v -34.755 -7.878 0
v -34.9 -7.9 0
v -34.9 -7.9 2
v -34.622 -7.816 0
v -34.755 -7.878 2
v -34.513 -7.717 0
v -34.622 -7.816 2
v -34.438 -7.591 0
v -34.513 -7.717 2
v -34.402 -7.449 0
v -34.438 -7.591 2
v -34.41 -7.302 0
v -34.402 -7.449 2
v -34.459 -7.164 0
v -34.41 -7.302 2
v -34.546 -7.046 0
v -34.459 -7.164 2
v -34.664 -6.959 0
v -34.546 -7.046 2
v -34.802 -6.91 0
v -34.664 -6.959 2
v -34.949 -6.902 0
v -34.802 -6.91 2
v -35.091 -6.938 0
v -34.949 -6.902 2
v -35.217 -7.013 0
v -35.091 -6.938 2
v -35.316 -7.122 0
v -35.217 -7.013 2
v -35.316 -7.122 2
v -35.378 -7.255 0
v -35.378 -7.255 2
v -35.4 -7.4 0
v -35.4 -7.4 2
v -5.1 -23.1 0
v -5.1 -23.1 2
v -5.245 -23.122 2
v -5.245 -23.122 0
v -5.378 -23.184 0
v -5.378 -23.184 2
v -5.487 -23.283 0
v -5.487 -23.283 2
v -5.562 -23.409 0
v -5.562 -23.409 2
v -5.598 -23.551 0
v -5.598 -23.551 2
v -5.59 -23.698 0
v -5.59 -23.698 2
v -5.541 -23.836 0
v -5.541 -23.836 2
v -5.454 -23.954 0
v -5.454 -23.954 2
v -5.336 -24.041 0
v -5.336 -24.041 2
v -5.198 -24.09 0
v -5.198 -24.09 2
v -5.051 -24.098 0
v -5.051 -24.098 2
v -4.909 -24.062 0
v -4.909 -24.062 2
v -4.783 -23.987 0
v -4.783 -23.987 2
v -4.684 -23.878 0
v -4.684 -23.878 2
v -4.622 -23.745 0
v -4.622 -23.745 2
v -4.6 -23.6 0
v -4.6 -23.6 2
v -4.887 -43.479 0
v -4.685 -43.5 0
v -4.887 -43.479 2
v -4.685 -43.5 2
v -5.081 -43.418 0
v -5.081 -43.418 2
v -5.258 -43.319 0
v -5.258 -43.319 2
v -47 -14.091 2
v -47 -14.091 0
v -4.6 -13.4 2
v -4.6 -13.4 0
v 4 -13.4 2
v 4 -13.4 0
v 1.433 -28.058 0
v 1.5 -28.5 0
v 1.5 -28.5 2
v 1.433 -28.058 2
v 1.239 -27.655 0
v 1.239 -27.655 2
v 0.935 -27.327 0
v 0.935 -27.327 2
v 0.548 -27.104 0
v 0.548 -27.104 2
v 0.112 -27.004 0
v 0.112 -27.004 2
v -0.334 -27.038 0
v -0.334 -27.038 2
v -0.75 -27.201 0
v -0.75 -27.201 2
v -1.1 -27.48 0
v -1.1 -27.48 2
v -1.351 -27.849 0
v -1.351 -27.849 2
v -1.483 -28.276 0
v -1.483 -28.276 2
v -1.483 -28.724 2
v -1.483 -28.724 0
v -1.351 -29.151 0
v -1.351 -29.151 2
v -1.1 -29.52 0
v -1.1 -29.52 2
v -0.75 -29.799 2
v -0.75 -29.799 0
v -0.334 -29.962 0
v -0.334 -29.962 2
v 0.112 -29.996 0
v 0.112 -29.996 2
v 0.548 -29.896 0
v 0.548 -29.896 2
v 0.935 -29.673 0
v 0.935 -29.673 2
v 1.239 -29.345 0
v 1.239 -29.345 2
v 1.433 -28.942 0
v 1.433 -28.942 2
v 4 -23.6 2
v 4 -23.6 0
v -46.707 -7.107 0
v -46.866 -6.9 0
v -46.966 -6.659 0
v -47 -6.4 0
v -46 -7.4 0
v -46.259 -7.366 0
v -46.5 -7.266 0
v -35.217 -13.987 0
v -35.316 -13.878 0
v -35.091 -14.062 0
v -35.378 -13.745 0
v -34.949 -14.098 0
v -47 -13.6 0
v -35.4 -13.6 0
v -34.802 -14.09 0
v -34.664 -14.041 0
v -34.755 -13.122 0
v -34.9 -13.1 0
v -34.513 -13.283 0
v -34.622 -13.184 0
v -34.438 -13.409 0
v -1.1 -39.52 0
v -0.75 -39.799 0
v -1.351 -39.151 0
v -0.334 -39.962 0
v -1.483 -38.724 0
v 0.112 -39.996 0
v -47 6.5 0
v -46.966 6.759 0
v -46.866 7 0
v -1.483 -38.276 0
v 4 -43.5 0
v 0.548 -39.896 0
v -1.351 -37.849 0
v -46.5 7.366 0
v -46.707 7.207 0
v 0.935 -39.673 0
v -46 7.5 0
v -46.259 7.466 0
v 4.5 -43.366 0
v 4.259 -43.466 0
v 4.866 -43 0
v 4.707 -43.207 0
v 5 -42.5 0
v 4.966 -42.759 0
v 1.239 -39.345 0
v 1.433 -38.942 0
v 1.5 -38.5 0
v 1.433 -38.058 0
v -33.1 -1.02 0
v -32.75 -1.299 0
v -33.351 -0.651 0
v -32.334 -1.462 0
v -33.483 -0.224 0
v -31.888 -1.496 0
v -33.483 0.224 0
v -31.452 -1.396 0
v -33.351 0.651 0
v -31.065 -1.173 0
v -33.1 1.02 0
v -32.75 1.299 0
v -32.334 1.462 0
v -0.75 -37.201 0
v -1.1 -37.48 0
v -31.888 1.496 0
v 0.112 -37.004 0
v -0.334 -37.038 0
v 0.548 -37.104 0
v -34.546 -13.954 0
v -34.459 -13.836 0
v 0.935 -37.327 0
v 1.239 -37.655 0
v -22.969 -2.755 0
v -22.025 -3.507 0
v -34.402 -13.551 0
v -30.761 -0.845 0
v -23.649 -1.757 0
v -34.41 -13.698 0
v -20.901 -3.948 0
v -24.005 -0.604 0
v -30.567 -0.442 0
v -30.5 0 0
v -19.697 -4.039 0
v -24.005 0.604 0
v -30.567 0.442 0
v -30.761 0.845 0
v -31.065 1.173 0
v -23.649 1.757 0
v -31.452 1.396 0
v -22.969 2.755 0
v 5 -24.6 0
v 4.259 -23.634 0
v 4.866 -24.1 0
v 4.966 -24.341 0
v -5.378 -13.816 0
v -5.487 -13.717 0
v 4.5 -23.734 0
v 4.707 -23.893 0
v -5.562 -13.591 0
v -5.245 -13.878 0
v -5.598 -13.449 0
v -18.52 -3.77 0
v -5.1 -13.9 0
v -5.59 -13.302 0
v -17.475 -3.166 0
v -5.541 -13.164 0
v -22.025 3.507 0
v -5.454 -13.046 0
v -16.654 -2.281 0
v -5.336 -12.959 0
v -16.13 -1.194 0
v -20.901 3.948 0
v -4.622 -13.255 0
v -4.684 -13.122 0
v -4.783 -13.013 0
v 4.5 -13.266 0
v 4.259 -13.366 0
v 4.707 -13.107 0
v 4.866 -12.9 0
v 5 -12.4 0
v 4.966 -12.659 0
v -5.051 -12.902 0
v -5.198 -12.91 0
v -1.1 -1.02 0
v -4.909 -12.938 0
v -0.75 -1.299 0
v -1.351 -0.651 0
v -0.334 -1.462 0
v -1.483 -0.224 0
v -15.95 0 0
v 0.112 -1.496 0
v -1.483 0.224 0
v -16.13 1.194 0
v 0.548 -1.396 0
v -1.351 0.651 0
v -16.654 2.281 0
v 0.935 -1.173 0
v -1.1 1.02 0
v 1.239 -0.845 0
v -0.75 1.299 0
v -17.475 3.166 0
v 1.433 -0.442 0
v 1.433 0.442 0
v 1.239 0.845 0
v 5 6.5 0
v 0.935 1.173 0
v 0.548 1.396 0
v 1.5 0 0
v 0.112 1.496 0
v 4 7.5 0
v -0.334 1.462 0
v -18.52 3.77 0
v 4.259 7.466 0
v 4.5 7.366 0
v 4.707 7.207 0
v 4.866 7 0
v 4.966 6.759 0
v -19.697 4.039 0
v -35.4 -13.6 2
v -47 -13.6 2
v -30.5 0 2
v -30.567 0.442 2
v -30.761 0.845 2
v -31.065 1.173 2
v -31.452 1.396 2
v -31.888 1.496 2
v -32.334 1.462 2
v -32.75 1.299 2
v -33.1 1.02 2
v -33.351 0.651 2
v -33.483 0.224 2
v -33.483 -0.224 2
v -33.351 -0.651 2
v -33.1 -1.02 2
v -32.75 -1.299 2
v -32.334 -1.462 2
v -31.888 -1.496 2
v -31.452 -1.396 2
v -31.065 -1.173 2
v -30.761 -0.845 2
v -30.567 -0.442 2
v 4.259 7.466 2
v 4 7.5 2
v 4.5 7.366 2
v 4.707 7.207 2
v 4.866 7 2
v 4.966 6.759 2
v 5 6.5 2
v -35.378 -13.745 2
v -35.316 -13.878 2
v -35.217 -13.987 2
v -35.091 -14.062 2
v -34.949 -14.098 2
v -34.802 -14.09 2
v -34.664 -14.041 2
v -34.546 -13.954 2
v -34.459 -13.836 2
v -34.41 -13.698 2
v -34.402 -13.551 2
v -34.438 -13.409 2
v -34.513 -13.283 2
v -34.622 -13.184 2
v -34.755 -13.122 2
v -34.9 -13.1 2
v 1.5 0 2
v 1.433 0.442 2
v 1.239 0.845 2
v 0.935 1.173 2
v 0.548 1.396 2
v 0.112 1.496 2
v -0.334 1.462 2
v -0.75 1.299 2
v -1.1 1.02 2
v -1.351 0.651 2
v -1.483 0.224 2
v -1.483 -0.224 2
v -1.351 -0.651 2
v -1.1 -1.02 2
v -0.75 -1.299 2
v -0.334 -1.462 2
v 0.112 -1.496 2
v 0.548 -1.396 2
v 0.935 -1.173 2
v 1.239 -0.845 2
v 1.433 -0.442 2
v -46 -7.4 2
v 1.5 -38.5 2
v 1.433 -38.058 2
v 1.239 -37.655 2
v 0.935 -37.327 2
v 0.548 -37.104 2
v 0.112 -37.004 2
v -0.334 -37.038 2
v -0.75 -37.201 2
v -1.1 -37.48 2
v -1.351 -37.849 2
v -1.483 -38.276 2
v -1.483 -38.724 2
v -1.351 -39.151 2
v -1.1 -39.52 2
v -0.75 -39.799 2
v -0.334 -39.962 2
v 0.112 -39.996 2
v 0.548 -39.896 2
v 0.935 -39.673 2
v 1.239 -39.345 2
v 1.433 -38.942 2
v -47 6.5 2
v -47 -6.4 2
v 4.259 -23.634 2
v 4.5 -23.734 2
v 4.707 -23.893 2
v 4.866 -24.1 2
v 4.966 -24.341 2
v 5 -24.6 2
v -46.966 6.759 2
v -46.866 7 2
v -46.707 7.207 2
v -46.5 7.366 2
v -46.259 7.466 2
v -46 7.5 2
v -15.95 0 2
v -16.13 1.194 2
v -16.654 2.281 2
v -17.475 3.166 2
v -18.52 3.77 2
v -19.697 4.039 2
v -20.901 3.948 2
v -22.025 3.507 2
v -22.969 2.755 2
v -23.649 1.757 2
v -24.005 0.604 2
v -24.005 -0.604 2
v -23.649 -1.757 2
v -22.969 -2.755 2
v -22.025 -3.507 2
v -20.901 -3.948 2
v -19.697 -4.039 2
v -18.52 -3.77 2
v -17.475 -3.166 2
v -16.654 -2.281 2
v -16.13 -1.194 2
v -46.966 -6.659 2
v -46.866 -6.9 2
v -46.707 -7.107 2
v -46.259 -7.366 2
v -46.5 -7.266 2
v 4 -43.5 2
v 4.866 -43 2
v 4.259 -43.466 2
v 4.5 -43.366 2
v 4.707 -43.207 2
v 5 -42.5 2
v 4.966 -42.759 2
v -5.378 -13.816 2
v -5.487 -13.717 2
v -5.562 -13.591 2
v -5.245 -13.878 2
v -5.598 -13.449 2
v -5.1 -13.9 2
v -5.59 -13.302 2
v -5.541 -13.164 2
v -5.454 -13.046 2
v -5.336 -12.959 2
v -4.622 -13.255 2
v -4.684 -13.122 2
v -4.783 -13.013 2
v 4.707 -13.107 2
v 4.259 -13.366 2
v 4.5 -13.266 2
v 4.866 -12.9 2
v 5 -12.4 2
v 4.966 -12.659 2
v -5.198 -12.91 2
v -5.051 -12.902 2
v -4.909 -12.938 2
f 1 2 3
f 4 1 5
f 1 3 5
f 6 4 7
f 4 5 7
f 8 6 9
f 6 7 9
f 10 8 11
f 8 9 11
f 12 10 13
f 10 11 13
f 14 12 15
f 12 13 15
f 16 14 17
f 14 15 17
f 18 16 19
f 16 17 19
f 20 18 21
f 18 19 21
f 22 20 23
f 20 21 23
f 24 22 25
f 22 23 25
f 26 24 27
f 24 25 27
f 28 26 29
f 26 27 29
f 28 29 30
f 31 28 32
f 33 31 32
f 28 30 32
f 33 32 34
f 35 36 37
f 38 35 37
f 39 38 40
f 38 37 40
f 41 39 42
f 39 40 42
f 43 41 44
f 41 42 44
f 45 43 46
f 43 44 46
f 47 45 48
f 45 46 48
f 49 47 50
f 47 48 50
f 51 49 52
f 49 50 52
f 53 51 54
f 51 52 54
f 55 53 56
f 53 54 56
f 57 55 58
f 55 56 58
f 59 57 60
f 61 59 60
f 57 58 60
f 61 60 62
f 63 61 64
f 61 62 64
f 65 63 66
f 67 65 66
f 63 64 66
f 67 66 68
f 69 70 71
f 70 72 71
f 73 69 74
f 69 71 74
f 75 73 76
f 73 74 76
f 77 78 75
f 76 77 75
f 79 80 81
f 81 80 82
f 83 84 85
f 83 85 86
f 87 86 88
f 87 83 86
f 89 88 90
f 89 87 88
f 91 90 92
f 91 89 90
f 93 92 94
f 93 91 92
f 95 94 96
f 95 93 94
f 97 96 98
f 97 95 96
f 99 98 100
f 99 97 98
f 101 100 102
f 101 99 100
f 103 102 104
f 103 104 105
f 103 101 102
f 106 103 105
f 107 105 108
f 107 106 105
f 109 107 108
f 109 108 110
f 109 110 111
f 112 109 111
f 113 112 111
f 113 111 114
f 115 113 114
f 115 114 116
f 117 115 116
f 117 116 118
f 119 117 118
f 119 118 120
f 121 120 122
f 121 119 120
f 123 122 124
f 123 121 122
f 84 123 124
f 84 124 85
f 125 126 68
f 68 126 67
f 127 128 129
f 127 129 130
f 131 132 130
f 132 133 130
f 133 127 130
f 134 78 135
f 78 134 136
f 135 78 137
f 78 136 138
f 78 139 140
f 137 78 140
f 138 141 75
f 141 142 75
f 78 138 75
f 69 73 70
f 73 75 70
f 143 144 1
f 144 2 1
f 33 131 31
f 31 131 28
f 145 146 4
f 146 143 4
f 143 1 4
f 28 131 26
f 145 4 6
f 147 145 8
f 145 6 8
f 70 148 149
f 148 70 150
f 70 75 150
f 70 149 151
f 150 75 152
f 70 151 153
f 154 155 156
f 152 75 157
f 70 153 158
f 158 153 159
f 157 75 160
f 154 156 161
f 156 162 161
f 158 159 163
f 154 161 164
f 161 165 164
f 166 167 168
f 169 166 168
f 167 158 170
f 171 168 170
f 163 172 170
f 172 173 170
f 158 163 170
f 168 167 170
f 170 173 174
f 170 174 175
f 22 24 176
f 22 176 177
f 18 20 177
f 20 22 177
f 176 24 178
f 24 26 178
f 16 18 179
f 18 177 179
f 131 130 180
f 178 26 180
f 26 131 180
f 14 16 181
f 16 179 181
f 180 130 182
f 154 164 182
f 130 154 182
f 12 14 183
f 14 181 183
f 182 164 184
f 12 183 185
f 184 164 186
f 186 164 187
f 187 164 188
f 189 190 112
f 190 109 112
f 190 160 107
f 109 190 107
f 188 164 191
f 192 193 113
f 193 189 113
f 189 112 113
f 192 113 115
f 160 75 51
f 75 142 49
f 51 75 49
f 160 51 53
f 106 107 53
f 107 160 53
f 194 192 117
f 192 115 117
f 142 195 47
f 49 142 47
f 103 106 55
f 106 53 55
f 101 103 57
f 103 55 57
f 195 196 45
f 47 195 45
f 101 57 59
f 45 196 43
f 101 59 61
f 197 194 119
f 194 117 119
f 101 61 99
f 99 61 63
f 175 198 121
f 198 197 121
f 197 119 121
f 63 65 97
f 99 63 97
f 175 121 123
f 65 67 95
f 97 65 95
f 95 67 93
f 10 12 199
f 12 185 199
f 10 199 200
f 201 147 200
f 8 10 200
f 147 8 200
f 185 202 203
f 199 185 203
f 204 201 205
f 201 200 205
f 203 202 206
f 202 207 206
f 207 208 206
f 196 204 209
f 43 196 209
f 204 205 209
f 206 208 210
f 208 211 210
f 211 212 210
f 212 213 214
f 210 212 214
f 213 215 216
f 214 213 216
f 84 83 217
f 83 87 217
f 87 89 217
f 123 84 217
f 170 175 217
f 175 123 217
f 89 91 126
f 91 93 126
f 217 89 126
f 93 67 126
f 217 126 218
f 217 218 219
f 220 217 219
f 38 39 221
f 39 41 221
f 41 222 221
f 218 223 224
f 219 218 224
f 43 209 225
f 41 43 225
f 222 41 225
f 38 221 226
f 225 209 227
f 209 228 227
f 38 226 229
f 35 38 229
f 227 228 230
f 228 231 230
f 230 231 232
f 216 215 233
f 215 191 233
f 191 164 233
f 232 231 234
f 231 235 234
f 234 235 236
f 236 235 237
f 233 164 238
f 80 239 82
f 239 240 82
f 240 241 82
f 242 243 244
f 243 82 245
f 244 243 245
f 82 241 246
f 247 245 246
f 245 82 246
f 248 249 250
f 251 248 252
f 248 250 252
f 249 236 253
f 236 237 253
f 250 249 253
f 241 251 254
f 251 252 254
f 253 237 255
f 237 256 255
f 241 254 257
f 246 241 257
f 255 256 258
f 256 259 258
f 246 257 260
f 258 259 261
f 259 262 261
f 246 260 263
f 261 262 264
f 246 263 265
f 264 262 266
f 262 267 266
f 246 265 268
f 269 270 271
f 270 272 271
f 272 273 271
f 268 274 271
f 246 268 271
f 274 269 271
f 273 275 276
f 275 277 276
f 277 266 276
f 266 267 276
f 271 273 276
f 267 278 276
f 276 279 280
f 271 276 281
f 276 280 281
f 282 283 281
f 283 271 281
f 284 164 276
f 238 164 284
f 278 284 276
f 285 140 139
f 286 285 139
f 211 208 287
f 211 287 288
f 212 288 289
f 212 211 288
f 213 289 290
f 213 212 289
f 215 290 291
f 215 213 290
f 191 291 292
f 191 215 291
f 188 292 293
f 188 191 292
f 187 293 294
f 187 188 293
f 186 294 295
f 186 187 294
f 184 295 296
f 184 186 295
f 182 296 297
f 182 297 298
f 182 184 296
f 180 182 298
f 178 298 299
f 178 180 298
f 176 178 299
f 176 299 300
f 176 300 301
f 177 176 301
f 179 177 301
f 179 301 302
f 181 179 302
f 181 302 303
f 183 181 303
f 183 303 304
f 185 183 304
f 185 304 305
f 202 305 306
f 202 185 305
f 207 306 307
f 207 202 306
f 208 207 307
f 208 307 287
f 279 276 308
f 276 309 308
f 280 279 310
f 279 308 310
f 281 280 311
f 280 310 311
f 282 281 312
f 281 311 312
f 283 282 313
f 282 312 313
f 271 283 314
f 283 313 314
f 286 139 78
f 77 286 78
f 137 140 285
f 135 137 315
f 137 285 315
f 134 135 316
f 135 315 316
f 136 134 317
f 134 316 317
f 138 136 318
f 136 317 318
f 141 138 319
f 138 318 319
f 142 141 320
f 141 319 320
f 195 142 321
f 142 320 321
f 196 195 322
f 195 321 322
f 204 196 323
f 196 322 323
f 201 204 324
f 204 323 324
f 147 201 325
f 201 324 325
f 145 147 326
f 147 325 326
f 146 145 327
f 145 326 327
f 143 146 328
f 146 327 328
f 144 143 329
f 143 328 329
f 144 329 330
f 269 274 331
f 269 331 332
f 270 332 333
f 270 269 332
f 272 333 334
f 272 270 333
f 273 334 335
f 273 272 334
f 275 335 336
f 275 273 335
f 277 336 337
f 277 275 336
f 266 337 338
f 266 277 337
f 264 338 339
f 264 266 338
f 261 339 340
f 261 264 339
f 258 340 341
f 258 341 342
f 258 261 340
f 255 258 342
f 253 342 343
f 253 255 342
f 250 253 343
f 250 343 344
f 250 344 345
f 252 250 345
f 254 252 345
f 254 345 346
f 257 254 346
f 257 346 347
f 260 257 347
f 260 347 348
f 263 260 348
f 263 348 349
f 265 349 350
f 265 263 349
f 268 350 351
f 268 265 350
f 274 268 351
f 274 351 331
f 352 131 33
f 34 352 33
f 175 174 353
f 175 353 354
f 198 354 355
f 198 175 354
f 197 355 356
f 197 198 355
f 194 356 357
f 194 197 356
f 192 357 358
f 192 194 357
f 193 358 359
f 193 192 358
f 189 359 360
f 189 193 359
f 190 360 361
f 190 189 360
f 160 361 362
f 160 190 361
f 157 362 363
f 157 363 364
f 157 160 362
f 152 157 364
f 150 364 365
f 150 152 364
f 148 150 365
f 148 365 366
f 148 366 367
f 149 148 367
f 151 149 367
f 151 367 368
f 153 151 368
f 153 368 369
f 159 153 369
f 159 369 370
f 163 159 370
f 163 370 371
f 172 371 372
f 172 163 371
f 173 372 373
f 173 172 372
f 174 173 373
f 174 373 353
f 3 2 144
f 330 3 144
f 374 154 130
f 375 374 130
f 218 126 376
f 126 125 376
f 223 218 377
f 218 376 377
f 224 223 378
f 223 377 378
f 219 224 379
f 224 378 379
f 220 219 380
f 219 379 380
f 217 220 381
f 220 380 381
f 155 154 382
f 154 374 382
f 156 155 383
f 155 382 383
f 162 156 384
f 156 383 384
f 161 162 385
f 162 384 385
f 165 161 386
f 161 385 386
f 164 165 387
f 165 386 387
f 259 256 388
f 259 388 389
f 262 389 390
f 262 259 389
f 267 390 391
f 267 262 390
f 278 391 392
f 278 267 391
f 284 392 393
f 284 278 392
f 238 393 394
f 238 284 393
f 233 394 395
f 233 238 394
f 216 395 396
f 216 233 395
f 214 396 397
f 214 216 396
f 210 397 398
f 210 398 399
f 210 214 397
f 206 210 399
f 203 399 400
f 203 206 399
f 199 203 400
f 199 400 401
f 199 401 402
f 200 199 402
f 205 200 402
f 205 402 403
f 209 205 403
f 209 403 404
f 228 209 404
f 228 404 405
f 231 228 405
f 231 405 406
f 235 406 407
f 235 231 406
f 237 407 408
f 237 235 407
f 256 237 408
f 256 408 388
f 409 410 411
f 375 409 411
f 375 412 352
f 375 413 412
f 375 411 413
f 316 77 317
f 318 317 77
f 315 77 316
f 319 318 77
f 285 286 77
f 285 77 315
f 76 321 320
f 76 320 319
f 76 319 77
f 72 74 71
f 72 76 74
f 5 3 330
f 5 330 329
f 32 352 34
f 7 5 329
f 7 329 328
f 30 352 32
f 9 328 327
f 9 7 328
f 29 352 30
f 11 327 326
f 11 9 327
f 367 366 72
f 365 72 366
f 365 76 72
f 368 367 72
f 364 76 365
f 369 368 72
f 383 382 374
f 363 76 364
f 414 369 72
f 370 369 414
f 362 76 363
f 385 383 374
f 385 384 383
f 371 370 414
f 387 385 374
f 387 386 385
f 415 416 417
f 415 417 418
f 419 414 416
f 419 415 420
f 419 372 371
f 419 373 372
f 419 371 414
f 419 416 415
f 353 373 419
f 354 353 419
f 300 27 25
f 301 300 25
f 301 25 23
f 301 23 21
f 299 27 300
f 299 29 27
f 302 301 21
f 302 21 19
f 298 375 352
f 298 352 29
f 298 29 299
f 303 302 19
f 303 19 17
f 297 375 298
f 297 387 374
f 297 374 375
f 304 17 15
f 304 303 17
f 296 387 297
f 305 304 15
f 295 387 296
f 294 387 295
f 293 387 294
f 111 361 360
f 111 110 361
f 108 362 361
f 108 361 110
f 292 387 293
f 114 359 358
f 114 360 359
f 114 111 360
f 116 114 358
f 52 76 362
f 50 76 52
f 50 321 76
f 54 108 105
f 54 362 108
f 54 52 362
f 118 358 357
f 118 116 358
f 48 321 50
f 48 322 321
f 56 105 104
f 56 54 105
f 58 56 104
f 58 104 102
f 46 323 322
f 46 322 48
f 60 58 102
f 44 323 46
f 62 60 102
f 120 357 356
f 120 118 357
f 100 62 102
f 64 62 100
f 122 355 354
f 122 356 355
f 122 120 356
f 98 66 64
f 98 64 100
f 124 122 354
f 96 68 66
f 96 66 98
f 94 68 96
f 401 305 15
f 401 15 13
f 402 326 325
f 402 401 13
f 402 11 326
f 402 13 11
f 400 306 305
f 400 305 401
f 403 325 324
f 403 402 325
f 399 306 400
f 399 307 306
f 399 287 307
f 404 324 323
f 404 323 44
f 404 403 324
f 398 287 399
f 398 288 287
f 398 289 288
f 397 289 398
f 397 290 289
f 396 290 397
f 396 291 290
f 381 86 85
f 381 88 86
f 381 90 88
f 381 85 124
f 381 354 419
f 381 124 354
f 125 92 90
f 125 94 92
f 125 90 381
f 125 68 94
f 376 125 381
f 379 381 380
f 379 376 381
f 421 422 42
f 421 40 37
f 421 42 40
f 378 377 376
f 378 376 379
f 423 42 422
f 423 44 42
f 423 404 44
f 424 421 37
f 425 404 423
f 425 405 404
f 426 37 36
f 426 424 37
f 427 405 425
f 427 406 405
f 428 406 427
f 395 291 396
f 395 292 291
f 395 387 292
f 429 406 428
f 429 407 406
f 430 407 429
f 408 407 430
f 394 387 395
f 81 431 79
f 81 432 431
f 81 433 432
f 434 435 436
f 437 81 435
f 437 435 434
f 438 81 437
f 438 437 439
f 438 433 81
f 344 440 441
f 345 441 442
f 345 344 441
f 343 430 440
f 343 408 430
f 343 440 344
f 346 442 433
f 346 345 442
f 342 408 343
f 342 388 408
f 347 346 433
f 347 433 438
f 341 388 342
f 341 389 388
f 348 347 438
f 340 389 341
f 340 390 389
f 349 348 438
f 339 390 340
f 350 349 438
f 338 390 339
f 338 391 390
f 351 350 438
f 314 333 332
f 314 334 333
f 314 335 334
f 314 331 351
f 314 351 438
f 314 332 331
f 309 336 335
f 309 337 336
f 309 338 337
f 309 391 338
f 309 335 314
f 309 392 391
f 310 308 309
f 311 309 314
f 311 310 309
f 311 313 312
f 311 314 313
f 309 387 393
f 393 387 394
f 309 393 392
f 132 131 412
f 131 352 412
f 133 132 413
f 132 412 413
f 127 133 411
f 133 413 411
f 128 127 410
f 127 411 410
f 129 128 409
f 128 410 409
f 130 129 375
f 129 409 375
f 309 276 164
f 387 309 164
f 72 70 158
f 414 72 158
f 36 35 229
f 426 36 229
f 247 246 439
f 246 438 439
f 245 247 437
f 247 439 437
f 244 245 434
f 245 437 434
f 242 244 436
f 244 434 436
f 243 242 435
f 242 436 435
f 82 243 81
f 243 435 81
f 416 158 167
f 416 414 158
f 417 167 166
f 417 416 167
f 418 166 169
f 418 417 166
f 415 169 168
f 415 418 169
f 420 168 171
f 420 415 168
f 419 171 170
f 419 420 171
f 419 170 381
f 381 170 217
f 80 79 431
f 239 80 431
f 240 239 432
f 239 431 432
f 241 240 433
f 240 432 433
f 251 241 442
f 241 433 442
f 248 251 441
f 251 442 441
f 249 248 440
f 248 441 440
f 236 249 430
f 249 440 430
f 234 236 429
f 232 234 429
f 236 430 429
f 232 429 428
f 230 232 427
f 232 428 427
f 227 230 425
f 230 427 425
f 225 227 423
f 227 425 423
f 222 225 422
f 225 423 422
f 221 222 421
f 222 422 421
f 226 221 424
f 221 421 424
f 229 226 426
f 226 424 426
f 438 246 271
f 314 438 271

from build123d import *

# Parameters (mm, degrees)
SKETCH_1_R          = 1.5
SKETCH_1_R_2        = 4.05
EXTRUDE_1_DEPTH     = 2
SKETCH_2_R          = 0.5
CUT_EXTRUDE_1_DEPTH = 10
FILLET_1_R          = 1


with BuildPart() as part:
    # 草图1 → 凸台-拉伸1 (new body)
    with BuildSketch(Plane.XY):
        Polygon((-5, -43.5), (5, -43.5), (5, -23.6), (-5.1, -23.6), (-5.1, -13.4), (5, -13.4), (5, 7.5), (-47, 7.5), (-47, -7.4), (-34.9, -7.4), (-34.9, -13.6), (-47, -13.6), (-47, -14.091283395), align=None)
        with Locations((-32, 0)):
            Circle(SKETCH_1_R, mode=Mode.SUBTRACT)
        Circle(SKETCH_1_R, mode=Mode.SUBTRACT)
        with Locations((0, -38.5)):
            Circle(SKETCH_1_R, mode=Mode.SUBTRACT)
        with Locations((0, -28.5)):
            Circle(SKETCH_1_R, mode=Mode.SUBTRACT)
        with Locations((-20, 0)):
            Circle(SKETCH_1_R_2, mode=Mode.SUBTRACT)
    extrude(amount=EXTRUDE_1_DEPTH)

    # 草图2 → 切除-拉伸1 (cut)
    with BuildSketch(Plane.XY.offset(2)):
        with Locations((-34.9, -7.4)):
            Circle(SKETCH_2_R)
        with Locations((-34.9, -13.6)):
            Circle(SKETCH_2_R)
        with Locations((-5.1, -13.4)):
            Circle(SKETCH_2_R)
        with Locations((-5.1, -23.6)):
            Circle(SKETCH_2_R)
    extrude(amount=-CUT_EXTRUDE_1_DEPTH, mode=Mode.SUBTRACT)

    # 圆角1
    fillet_1_edges = [part.edges().sort_by_distance(p)[0] for p in [
        (-47, -7.4, 1),
        (-47, 7.5, 1),
        (5, 7.5, 1),
        (5, -13.4, 1),
        (5, -23.6, 1),
        (5, -43.5, 1),
        (-5, -43.5, 1),
    ]]
    fillet(fillet_1_edges, radius=FILLET_1_R)


solid = part.part
